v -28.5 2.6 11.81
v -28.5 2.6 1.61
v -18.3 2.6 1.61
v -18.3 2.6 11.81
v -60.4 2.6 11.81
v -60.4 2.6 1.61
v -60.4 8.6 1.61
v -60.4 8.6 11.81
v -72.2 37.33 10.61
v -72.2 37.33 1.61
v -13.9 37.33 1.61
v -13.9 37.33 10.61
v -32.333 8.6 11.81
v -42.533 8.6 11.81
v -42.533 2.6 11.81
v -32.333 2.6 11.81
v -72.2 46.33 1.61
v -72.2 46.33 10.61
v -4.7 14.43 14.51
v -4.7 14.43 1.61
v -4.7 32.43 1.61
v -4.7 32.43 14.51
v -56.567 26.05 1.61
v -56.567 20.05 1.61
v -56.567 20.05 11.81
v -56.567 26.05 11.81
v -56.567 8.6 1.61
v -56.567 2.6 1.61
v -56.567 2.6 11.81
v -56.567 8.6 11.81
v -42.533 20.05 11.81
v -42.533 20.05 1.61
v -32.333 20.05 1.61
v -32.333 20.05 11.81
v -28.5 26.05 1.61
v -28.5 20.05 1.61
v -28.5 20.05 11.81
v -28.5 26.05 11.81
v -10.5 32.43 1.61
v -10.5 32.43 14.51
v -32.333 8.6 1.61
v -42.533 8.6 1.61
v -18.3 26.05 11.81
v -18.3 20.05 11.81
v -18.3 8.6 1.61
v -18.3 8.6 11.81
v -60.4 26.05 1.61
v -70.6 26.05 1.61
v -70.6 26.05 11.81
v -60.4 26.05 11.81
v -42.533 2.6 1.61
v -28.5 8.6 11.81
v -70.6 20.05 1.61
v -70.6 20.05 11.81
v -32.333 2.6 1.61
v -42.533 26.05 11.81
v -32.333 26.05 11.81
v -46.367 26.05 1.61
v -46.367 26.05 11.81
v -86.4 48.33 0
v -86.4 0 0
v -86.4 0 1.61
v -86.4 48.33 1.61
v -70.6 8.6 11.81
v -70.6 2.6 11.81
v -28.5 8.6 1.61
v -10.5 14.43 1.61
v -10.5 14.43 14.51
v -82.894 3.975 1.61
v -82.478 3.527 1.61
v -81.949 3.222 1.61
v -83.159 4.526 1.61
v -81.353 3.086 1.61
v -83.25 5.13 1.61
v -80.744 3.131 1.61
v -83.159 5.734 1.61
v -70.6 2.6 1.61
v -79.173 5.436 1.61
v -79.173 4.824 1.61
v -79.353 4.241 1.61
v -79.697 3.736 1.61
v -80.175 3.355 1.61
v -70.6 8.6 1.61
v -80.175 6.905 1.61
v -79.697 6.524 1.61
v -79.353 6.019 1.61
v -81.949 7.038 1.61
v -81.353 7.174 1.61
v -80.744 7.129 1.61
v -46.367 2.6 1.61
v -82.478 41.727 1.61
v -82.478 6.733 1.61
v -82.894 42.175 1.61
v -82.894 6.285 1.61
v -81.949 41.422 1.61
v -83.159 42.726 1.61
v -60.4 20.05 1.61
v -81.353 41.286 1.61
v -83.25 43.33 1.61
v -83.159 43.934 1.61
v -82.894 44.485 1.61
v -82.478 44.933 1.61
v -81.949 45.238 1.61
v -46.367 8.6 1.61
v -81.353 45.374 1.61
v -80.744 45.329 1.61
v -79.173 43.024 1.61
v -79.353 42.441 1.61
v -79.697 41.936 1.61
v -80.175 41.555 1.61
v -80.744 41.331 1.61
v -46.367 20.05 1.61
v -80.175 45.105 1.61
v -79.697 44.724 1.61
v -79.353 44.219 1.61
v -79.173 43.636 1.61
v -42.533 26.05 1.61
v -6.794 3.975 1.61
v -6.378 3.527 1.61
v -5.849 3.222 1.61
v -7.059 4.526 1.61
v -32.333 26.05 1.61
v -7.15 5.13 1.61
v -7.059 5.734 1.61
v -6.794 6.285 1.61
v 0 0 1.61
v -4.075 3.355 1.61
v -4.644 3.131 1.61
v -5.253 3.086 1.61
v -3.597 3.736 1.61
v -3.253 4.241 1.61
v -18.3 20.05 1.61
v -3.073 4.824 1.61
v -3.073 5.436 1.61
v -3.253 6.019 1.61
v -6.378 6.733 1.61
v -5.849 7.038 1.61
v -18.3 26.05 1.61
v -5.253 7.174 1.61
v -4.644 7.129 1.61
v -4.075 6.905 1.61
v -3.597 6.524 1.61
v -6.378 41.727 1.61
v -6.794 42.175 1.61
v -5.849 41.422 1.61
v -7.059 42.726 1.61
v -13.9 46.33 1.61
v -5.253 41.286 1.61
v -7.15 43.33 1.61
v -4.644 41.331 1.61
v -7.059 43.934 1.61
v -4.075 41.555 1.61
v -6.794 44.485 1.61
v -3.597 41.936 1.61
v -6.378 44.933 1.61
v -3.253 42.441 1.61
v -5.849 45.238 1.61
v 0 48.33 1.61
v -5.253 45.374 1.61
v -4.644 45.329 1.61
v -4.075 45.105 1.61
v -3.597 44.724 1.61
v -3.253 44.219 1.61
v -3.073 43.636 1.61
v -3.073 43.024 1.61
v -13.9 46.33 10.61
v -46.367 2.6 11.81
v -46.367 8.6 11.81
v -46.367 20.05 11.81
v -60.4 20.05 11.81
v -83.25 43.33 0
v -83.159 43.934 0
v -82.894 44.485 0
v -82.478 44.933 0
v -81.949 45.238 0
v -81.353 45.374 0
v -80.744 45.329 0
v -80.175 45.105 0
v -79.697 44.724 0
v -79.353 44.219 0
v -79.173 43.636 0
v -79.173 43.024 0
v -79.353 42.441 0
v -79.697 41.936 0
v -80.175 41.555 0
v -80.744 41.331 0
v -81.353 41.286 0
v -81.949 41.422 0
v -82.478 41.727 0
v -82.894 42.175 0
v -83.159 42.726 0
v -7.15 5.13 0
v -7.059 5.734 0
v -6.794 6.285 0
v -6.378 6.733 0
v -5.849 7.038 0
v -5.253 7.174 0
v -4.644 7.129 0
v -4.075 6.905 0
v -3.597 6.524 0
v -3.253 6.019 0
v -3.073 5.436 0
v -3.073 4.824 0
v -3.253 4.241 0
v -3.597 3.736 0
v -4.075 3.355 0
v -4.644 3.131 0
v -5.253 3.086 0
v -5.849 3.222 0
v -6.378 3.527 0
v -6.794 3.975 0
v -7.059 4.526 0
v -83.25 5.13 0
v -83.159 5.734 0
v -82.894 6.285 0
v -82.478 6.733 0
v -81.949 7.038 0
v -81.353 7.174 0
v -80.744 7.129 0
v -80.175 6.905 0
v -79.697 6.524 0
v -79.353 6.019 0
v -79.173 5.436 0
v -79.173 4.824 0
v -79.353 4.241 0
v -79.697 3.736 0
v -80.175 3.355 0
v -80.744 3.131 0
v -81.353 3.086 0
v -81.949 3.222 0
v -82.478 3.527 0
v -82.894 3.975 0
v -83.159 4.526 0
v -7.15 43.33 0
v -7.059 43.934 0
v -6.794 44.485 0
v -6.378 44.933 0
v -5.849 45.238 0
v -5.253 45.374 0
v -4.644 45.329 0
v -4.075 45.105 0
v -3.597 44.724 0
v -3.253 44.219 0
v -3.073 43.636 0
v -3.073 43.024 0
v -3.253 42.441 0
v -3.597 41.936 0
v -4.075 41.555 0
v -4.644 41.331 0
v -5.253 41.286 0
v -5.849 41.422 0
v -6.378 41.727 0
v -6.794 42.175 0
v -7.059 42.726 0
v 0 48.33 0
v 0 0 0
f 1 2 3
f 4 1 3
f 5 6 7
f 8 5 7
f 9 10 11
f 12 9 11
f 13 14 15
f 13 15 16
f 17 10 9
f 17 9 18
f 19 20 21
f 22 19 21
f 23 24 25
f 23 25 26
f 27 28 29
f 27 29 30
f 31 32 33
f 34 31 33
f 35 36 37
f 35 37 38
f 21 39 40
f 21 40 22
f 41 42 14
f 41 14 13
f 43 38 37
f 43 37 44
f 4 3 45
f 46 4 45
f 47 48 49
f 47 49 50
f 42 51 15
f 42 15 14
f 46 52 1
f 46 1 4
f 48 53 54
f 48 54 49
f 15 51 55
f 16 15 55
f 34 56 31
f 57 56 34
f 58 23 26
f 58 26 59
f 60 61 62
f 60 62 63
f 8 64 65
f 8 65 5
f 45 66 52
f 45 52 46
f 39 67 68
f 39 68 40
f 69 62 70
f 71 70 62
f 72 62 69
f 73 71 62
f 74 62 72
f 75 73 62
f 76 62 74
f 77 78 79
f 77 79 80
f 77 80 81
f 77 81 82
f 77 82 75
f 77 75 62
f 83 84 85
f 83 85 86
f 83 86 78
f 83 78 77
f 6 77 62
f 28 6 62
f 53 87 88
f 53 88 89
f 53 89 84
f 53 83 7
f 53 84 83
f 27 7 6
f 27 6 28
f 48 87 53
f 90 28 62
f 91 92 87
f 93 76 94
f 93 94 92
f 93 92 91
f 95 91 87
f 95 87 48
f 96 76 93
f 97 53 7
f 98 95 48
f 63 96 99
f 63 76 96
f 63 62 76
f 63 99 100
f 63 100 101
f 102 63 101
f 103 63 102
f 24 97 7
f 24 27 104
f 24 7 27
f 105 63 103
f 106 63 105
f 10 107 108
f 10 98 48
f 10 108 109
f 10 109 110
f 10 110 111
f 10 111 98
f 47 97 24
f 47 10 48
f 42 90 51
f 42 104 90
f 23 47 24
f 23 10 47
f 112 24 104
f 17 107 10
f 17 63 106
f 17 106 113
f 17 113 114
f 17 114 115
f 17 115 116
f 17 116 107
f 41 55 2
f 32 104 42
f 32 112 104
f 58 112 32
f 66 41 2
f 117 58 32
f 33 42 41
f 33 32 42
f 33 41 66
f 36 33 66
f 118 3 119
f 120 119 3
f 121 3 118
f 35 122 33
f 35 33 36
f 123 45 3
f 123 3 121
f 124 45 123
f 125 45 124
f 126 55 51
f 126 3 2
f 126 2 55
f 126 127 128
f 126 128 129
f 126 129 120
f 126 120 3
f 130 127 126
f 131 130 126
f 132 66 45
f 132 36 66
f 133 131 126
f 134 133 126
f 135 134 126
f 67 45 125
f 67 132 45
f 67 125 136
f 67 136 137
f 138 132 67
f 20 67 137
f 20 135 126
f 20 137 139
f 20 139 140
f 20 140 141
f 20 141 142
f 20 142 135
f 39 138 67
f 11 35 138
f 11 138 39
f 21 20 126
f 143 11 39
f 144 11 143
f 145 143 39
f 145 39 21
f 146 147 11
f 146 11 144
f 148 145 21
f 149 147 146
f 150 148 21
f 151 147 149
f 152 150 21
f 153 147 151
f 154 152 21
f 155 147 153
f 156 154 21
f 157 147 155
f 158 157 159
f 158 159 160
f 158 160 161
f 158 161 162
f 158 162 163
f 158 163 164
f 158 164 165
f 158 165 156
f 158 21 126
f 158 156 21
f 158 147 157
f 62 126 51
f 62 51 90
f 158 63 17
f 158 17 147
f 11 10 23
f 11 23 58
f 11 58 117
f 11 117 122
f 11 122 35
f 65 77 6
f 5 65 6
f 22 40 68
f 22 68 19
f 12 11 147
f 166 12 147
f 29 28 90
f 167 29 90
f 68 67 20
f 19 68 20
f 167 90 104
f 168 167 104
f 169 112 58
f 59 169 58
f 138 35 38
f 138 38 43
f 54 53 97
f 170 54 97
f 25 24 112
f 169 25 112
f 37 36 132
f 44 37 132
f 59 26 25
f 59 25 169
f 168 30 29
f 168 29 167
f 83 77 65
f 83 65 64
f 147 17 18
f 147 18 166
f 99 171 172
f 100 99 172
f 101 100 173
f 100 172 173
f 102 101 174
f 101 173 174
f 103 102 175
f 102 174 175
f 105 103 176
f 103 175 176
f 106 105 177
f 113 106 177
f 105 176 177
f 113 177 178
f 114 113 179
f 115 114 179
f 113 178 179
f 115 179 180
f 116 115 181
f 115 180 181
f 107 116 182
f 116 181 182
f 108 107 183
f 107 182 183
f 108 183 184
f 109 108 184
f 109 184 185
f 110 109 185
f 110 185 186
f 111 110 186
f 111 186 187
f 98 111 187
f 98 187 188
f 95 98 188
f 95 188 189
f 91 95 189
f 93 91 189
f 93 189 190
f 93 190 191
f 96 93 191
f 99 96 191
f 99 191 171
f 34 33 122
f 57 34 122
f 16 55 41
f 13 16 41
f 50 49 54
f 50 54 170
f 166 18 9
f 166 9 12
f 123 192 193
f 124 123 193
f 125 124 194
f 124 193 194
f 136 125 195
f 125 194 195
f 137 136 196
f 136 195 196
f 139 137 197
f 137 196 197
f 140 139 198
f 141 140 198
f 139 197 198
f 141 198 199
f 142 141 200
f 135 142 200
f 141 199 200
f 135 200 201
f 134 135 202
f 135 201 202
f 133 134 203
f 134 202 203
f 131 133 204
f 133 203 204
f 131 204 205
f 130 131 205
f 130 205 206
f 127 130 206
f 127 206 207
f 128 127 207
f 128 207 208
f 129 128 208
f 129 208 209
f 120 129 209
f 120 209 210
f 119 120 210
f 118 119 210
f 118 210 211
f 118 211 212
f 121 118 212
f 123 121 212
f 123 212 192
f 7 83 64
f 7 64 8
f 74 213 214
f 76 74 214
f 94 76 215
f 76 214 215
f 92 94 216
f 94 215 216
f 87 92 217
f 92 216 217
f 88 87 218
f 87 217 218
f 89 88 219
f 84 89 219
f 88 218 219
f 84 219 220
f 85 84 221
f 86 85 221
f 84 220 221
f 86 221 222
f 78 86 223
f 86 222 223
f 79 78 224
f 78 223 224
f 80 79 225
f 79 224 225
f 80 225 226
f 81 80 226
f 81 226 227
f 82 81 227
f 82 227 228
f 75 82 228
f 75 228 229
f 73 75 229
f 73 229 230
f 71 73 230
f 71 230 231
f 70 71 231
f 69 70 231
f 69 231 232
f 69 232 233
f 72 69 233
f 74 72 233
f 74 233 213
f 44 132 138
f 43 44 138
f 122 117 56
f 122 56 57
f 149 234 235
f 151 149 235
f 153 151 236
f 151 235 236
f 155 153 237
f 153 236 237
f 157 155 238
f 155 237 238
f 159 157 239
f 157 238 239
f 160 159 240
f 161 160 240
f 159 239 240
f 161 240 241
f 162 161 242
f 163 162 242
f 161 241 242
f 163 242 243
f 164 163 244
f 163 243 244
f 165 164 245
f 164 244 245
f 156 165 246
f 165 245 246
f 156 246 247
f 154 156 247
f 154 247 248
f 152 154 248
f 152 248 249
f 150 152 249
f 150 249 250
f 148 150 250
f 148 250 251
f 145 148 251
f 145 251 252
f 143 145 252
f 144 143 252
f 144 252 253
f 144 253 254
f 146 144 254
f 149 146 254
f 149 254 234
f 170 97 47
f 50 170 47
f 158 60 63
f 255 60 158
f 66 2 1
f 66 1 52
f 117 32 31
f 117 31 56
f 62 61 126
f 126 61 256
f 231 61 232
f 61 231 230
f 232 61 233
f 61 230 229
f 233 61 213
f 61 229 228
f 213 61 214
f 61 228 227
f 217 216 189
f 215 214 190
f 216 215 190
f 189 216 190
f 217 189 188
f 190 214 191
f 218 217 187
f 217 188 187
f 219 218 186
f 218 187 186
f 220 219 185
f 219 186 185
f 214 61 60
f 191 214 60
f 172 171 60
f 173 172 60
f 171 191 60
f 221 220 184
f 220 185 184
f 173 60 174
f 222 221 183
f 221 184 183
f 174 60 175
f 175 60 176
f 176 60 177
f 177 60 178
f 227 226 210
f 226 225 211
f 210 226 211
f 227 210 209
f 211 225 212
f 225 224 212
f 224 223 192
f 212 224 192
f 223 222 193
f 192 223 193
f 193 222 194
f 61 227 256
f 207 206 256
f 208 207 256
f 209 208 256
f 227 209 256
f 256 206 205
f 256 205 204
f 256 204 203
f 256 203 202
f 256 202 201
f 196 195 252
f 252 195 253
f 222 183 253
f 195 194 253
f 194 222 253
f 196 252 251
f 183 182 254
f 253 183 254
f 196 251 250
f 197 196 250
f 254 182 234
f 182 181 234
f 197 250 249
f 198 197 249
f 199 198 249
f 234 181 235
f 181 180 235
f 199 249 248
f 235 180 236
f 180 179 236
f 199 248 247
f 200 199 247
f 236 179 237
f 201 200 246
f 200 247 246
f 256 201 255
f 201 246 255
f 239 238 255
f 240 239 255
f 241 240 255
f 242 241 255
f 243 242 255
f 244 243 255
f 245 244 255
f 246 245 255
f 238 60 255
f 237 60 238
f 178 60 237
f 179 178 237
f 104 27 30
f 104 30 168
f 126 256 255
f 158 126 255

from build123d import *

# Parameters (mm, degrees)
F0_W     = 86.4
F0_H     = 48.33
F1_DEPTH = 1.61
F3_D     = 4.1
F4_W     = 58.3
F4_H     = 9
F5_DEPTH = 9
F6_W     = 5.8
F6_H     = 18
F7_DEPTH = 12.9
F8_W     = 10.2
F8_H     = 6
F9_DEPTH = 10.2


with BuildPart() as f1:
    # F0 (on Top) → F1 (new body)
    with BuildSketch(Plane.XY):
        with Locations((-43.2, 24.165)):
            Rectangle(F0_W, F0_H)
    extrude(amount=F1_DEPTH)

    # F3 (through all)
    with Locations(Plane.XY.offset(1.61)):
        with Locations((-81.2, 43.33), (-5.1, 43.33), (-5.1, 5.13), (-81.2, 5.13)):
            Hole(F3_D / 2)

    # F4 (on face) → F5 (join)
    with BuildSketch(Plane.XY.offset(1.61)):
        with Locations((-43.05, 41.83)):
            Rectangle(F4_W, F4_H)
    extrude(amount=F5_DEPTH)

    # F6 (on face) → F7 (join)
    with BuildSketch(Plane.XY.offset(1.61)):
        with Locations((-7.6, 23.43)):
            Rectangle(F6_W, F6_H)
    extrude(amount=F7_DEPTH)

    # F8 (on face) → F9 (join)
    with BuildSketch(Plane.XY.offset(1.61)):
        with Locations((-23.4, 5.6)):
            Rectangle(F8_W, F8_H)
        with Locations((-23.4, 23.05)):
            Rectangle(F8_W, F8_H)
        with Locations((-37.433333, 5.6)):
            Rectangle(F8_W, F8_H)
        with Locations((-37.433333, 23.05)):
            Rectangle(F8_W, F8_H)
        with Locations((-51.466667, 5.6)):
            Rectangle(F8_W, F8_H)
        with Locations((-51.466667, 23.05)):
            Rectangle(F8_W, F8_H)
        with Locations((-65.5, 5.6)):
            Rectangle(F8_W, F8_H)
        with Locations((-65.5, 23.05)):
            Rectangle(F8_W, F8_H)
    extrude(amount=F9_DEPTH)


solid = f1.part
